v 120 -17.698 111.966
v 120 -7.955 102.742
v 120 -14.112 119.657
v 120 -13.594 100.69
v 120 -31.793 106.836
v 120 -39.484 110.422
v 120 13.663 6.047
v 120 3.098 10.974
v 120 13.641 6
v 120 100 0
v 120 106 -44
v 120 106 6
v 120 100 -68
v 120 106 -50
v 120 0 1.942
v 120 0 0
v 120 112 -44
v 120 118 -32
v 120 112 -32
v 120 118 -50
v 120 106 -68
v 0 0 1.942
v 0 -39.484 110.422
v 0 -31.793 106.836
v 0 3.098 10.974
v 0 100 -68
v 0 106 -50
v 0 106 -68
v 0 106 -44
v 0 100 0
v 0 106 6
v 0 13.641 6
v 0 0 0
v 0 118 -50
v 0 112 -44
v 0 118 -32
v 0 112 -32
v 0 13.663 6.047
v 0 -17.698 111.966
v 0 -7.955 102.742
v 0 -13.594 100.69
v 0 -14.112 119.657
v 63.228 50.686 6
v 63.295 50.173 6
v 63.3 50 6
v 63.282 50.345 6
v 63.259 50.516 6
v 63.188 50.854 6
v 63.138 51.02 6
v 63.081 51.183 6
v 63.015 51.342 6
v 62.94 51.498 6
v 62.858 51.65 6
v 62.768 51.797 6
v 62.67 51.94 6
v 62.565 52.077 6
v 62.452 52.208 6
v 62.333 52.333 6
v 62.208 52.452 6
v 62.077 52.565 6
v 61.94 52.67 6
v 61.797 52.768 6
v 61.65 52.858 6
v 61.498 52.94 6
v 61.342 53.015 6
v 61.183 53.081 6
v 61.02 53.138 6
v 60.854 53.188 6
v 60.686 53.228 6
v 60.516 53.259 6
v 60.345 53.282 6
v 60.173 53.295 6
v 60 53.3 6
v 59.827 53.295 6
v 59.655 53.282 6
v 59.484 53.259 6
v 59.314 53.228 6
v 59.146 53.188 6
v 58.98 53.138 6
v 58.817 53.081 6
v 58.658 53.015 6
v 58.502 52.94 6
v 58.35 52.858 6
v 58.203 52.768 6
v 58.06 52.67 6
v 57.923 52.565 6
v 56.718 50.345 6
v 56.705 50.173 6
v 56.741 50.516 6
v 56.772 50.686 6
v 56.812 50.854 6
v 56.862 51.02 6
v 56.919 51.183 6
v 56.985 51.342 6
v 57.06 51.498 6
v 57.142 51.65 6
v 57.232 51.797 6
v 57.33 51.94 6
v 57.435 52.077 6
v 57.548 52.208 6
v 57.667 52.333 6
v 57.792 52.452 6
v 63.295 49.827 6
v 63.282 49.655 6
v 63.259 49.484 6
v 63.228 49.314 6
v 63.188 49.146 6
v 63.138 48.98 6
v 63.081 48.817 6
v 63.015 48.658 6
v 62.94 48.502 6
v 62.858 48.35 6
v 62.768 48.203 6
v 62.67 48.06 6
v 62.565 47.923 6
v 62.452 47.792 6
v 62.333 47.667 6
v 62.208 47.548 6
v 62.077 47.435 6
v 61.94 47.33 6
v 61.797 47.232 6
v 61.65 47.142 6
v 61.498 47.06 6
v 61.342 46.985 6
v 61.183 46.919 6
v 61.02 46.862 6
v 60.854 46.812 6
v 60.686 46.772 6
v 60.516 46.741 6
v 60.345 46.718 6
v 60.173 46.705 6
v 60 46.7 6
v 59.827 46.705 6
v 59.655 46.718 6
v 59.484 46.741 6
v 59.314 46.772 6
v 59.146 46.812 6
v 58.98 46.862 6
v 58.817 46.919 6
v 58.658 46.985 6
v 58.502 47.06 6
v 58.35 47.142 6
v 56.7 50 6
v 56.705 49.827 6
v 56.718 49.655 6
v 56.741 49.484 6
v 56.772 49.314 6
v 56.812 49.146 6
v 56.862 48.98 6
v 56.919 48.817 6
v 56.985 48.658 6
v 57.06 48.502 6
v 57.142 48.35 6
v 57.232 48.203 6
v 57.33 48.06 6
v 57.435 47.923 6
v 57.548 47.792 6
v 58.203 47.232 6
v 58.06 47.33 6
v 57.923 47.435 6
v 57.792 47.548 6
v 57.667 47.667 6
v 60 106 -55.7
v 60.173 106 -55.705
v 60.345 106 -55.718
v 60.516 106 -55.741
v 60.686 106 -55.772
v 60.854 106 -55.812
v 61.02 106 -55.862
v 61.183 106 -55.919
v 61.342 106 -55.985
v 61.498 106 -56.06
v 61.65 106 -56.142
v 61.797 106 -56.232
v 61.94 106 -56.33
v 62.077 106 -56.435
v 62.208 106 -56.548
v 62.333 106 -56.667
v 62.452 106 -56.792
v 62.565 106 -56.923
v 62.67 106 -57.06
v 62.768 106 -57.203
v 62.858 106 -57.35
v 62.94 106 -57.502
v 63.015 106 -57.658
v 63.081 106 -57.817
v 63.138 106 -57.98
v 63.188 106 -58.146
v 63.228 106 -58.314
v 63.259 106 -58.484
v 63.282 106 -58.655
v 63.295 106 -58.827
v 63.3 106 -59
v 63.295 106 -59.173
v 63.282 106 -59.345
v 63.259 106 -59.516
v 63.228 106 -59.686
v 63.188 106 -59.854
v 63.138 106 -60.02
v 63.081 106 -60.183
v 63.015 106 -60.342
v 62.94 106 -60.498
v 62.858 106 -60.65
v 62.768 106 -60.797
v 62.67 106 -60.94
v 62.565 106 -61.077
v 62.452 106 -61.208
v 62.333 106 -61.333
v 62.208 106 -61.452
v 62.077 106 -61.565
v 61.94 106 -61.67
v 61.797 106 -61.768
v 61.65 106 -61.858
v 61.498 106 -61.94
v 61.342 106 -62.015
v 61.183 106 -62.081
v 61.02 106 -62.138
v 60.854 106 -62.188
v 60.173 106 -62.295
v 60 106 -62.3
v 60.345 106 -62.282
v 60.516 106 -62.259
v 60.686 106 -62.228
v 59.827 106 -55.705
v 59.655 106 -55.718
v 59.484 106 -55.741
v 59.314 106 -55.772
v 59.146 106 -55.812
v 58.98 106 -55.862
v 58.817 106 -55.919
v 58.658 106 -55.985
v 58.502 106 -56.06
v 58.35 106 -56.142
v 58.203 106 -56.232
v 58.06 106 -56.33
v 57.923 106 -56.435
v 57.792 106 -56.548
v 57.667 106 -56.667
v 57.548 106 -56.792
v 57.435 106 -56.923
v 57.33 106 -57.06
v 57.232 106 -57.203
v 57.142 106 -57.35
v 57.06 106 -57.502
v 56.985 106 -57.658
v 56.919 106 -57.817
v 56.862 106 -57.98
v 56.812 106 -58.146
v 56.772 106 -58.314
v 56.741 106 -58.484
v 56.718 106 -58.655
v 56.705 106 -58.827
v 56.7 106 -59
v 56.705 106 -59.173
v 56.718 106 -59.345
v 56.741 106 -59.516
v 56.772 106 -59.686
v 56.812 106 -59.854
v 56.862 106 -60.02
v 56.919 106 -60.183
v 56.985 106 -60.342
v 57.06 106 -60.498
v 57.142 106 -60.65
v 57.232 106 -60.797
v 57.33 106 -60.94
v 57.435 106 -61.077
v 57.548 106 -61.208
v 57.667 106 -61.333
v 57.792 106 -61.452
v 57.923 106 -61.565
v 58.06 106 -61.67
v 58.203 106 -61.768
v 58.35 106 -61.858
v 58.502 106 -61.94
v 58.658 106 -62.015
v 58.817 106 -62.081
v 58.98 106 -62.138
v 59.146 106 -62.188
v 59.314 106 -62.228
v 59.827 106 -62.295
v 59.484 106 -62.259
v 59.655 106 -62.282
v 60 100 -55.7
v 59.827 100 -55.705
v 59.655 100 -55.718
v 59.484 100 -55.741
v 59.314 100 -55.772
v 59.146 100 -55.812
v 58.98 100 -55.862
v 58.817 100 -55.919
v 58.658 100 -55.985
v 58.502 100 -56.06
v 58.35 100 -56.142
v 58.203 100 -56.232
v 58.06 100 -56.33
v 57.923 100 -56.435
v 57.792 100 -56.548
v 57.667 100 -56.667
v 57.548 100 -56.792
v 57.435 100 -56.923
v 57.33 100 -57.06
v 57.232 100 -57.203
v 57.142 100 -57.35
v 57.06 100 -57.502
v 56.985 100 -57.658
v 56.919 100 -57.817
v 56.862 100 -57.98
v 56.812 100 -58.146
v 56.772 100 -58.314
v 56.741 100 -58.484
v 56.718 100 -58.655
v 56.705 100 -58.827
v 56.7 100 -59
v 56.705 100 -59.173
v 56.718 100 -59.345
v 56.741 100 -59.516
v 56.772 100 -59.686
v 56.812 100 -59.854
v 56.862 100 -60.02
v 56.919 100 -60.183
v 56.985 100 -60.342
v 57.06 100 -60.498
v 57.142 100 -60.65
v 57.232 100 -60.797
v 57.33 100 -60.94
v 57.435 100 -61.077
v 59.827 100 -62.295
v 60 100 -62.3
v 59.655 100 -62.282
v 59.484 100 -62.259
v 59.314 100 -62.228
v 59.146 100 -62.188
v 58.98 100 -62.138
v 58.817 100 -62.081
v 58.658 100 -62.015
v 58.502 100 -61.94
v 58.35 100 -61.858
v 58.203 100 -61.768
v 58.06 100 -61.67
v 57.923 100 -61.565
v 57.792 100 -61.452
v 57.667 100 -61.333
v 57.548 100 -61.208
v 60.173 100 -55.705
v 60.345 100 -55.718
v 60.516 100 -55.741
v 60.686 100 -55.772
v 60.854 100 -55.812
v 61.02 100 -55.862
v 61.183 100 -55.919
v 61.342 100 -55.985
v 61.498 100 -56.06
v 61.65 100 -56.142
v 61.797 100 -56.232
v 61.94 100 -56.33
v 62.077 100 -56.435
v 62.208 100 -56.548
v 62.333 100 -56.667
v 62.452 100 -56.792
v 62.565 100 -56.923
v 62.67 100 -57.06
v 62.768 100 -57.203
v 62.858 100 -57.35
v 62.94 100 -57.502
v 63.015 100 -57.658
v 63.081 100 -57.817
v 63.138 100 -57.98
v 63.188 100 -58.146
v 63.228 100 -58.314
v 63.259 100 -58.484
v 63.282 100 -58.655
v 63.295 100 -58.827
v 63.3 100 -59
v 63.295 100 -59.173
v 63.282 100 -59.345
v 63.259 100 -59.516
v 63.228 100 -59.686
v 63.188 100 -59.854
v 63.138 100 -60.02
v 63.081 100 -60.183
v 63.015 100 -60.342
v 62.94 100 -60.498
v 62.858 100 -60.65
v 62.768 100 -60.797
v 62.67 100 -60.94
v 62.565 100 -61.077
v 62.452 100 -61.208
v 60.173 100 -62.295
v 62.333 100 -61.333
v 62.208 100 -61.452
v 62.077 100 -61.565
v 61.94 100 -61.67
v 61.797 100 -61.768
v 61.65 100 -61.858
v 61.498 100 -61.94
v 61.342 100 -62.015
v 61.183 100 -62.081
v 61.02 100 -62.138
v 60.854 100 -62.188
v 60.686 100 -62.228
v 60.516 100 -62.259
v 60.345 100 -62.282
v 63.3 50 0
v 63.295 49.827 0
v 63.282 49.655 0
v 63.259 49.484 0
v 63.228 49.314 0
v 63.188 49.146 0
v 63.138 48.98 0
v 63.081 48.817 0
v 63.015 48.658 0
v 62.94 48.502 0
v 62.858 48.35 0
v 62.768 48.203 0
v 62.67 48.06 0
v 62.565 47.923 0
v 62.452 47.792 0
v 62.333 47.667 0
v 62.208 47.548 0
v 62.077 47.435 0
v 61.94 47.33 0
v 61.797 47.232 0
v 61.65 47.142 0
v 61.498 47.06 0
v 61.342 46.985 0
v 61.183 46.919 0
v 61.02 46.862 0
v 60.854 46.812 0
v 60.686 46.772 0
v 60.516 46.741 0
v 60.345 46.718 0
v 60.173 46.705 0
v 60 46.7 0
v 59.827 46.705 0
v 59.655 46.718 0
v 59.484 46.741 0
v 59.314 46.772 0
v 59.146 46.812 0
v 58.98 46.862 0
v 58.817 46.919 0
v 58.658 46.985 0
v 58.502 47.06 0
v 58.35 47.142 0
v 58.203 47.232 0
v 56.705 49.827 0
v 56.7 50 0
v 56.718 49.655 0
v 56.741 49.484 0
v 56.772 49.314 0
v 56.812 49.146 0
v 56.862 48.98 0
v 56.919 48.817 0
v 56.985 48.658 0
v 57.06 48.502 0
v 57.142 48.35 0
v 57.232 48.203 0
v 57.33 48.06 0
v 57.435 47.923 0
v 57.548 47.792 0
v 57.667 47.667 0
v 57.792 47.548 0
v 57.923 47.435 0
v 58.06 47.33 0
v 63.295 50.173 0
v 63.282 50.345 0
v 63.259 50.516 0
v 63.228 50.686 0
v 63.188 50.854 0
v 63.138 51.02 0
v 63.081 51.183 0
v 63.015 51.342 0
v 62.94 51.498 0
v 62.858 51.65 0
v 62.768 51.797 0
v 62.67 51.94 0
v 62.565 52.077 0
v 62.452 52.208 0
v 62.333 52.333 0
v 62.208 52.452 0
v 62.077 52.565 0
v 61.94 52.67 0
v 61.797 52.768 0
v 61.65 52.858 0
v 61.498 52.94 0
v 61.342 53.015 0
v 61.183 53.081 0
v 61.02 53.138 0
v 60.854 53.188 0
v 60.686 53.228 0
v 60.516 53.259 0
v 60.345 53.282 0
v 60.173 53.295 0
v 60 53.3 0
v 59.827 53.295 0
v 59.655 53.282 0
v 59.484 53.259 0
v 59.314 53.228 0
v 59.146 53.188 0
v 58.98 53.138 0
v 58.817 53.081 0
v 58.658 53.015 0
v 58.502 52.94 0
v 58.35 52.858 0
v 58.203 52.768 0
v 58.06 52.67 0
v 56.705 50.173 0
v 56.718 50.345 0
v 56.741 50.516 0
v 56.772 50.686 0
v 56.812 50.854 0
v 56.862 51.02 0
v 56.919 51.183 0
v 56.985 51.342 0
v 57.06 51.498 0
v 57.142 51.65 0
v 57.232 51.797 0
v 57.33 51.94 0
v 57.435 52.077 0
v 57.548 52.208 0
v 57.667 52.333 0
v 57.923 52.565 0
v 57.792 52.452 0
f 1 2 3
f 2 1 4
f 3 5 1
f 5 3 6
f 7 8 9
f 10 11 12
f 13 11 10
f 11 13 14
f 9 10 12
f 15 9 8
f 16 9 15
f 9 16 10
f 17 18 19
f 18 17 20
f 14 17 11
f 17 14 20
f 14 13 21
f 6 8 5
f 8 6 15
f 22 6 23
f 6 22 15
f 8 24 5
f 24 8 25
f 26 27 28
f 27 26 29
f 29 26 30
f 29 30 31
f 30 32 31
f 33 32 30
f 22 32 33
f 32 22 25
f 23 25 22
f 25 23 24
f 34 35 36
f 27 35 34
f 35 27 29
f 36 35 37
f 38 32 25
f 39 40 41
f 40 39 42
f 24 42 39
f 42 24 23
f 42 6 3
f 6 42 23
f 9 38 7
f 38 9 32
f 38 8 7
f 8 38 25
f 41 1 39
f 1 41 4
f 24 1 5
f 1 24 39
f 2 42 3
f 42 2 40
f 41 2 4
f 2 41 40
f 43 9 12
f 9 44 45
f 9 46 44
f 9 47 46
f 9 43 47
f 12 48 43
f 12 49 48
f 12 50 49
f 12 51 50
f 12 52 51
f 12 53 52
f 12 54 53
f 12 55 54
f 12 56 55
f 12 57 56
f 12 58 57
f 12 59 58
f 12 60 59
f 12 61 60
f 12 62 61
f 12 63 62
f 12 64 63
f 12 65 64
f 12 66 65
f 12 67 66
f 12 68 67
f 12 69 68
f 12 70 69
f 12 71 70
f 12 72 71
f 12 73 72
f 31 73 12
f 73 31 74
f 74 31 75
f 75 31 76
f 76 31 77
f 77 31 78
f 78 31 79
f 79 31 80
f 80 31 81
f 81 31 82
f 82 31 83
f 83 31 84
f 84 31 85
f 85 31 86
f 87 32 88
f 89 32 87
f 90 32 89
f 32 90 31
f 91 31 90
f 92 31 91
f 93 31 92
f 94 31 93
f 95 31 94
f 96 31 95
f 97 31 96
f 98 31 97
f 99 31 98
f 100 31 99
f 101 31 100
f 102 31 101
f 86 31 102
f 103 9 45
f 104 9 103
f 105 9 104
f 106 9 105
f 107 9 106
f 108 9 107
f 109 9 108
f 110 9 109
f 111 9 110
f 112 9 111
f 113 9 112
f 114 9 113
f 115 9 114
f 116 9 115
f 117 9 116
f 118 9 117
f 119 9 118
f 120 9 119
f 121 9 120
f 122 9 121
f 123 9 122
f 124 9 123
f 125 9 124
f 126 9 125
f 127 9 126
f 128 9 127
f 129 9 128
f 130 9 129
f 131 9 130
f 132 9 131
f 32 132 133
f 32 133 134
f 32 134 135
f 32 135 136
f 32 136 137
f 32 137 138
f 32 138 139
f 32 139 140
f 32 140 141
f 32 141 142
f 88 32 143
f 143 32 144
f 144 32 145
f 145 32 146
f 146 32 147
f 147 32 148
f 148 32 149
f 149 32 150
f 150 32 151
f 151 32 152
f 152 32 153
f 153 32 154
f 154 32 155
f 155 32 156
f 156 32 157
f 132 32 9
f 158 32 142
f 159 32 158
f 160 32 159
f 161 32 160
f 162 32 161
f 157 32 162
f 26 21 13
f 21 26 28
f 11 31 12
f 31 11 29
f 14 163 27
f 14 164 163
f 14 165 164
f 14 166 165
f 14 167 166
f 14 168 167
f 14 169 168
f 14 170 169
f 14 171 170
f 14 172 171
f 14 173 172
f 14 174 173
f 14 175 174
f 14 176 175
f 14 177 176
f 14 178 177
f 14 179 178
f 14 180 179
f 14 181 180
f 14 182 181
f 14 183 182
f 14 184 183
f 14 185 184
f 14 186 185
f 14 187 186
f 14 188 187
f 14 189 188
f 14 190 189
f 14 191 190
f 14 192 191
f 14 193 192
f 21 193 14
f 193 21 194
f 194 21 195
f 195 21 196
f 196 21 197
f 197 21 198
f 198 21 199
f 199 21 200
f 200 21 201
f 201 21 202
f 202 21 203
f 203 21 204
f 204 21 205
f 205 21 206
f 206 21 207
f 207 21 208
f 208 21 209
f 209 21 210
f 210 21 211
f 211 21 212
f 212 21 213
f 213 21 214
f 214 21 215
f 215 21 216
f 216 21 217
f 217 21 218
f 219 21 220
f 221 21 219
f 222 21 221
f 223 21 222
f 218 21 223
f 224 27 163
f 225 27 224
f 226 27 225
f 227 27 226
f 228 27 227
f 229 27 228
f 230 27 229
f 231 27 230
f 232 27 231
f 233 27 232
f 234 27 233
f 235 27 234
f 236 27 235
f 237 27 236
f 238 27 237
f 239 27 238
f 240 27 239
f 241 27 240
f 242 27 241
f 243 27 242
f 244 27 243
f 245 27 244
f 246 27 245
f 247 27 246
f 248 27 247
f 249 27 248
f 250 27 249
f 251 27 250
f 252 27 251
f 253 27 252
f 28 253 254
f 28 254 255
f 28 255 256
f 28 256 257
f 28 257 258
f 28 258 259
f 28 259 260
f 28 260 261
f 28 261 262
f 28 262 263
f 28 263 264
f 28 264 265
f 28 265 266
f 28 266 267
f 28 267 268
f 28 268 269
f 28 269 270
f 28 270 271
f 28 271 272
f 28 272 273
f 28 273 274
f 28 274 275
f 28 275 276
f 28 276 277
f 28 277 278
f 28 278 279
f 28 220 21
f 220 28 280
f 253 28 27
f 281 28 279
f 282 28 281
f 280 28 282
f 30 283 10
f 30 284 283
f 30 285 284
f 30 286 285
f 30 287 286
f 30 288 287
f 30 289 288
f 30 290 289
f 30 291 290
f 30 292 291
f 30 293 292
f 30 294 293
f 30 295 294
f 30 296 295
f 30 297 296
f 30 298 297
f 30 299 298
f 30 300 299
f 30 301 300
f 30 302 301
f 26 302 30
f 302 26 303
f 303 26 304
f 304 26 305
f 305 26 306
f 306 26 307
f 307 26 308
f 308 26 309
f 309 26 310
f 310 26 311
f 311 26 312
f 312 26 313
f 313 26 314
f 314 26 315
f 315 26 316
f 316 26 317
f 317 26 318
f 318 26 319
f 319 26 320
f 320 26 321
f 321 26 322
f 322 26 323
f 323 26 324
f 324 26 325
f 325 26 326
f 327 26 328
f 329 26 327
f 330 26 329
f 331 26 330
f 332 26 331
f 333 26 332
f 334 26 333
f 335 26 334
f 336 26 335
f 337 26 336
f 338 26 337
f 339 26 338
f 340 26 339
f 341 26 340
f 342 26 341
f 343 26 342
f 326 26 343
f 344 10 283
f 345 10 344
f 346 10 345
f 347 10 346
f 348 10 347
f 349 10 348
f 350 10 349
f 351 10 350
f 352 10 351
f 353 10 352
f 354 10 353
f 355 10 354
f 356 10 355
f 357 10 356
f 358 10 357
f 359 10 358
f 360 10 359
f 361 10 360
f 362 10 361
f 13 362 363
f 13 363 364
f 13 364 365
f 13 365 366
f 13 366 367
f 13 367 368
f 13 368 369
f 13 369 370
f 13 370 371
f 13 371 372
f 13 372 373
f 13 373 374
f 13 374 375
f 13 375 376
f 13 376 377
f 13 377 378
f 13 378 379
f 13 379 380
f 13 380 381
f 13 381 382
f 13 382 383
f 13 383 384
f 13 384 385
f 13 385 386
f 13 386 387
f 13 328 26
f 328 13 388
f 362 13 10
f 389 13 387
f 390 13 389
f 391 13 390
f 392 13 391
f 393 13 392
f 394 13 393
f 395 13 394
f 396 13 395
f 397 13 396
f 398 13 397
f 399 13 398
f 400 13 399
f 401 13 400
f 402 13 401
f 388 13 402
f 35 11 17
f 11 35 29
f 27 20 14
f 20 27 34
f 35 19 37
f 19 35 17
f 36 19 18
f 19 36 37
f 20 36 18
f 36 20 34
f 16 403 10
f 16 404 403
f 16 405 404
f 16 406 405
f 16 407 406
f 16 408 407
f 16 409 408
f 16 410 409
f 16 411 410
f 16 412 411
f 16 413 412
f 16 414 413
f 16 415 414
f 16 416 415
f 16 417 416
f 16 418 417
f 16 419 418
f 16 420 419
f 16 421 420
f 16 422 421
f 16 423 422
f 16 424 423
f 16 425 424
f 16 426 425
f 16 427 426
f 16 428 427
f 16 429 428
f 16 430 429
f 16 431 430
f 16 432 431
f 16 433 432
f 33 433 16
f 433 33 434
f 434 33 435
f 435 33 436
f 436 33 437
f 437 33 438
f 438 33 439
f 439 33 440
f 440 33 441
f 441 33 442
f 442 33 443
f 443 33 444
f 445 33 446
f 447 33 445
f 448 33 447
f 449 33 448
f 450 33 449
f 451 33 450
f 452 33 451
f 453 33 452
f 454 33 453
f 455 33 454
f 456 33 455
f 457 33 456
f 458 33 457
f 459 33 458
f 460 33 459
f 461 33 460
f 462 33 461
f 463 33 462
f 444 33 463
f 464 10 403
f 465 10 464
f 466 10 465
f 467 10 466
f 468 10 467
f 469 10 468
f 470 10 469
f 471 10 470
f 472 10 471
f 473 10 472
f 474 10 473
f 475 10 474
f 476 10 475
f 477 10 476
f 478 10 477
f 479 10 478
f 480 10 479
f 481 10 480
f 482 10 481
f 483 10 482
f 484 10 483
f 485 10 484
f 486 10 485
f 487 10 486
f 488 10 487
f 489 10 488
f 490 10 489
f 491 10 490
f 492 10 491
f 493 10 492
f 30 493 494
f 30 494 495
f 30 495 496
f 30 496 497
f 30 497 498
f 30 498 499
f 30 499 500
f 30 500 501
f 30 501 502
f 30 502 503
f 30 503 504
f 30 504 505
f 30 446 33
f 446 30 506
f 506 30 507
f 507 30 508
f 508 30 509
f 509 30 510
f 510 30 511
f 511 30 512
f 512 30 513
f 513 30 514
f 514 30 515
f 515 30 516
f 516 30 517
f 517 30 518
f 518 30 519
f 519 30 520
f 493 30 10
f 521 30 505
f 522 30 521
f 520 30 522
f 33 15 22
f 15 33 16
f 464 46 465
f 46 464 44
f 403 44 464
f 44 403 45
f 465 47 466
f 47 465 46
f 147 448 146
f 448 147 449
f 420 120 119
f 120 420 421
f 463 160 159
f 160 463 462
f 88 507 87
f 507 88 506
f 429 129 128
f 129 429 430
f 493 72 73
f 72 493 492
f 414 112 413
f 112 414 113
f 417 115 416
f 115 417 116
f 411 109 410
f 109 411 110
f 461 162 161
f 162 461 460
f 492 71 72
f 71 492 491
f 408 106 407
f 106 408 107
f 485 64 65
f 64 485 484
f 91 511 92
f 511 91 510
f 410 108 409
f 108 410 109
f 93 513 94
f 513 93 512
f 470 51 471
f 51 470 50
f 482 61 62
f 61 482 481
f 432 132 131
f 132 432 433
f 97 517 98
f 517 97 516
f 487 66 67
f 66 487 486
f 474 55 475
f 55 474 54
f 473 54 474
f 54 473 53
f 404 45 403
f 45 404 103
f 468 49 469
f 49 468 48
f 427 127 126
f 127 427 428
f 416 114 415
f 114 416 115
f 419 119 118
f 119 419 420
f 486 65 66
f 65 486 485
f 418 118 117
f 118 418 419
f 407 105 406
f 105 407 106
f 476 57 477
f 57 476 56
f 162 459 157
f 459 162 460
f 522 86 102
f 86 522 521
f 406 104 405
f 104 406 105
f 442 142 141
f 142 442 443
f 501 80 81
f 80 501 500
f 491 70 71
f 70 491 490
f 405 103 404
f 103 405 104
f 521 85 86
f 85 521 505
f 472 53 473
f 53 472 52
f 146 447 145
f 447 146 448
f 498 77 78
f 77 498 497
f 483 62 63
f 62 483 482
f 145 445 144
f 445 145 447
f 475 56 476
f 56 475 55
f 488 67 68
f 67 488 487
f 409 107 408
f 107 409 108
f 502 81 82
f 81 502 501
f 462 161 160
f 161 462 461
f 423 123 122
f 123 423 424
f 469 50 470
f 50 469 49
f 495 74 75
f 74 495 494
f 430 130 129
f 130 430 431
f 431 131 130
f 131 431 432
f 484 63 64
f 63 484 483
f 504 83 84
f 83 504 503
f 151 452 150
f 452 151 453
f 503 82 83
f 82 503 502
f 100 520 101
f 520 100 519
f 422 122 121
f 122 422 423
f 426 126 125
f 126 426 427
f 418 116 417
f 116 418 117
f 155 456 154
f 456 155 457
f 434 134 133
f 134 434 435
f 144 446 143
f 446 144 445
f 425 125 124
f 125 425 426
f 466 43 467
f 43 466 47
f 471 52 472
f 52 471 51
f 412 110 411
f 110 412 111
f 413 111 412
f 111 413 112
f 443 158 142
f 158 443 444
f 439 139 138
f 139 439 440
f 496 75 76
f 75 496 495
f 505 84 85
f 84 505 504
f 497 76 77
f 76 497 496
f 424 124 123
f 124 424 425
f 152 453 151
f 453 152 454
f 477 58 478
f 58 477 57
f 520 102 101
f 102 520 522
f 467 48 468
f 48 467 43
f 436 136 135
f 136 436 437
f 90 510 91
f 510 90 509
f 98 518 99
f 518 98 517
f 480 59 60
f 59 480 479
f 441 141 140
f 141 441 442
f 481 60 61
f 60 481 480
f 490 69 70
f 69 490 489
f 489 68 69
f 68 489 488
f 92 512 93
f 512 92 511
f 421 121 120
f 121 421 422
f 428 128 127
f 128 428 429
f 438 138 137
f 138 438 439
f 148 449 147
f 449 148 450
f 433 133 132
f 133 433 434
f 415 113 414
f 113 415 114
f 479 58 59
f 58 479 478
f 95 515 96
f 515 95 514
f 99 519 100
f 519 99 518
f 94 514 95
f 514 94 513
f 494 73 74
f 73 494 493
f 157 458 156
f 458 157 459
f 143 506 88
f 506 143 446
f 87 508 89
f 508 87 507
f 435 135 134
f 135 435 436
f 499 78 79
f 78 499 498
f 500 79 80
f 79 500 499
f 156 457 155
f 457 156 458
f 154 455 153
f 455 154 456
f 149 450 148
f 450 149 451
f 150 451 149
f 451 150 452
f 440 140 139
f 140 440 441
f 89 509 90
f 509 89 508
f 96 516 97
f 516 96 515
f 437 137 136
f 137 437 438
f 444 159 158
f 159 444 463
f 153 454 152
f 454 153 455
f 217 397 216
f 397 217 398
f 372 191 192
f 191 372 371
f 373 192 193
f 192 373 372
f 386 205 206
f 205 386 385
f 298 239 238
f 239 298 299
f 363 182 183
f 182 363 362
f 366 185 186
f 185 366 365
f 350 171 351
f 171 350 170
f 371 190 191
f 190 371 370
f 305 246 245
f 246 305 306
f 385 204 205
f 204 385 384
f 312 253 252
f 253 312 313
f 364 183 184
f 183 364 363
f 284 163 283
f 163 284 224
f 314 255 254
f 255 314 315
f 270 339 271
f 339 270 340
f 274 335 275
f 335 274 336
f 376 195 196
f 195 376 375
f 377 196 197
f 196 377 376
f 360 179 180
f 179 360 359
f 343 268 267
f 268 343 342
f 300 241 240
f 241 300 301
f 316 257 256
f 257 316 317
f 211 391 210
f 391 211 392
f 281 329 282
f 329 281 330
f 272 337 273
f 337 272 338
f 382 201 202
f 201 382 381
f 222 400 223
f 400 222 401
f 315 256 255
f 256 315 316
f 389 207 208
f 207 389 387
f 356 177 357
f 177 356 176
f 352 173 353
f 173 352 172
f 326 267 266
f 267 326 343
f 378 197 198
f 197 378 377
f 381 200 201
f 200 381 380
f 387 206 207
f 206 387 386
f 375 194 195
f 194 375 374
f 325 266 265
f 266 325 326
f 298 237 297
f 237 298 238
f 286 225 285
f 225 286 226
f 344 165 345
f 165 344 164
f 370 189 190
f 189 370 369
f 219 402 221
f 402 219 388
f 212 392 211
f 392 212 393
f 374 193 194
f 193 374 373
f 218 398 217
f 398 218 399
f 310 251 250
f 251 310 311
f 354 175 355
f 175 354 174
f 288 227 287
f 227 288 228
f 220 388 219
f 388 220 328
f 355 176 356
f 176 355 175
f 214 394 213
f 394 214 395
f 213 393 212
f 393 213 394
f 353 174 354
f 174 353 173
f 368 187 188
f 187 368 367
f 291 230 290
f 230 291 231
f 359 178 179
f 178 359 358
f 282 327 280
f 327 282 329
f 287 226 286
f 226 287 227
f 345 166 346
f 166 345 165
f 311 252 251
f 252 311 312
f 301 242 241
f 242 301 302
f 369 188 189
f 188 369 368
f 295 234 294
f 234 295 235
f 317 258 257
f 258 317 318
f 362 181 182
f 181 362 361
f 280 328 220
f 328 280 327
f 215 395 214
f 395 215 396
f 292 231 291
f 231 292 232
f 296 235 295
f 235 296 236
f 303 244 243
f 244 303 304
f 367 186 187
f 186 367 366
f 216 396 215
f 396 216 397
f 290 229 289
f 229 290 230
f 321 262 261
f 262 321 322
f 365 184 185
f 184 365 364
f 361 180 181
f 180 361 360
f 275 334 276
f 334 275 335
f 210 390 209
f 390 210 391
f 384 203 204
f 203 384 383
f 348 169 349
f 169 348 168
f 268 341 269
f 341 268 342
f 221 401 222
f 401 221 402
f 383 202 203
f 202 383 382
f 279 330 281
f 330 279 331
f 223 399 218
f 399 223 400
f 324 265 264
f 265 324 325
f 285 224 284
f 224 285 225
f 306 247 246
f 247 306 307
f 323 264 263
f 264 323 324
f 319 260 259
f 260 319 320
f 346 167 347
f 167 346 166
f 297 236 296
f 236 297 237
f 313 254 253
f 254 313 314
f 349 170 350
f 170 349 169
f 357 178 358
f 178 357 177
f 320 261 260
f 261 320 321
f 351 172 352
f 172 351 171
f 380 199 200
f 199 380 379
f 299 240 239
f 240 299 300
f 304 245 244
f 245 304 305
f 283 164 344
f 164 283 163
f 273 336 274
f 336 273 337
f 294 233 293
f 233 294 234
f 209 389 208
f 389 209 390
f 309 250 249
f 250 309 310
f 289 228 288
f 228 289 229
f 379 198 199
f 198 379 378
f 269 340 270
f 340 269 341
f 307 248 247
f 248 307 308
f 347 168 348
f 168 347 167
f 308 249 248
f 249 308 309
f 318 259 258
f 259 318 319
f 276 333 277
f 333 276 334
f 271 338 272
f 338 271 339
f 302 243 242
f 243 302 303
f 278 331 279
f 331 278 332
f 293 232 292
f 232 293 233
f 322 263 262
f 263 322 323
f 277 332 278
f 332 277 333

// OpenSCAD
$fn = 120;
tub_width = 100;
guard_height = 98.5 + 18;
guard_width = 155;
guard_thickness = 6;
guard_angle = 110;
bracket_width = 120;
screw_hole_diameter = 6.6;
gusset_size = 4;

difference() {
  bracket();
  translate([bracket_width/2, tub_width/2, -1])
  cylinder(h=guard_thickness*2, d=screw_hole_diameter);

  translate([bracket_width/2, tub_width+guard_thickness+1, -56+guard_thickness - guard_thickness*1.5])
  rotate([90, 0, 0])
  cylinder(h=guard_thickness*2, d=screw_hole_diameter);
}

module bracket() {
  union() {
    color("yellow")
    cube([bracket_width, tub_width, guard_thickness]);

    translate([0, guard_thickness, guard_thickness/2])
    rotate([guard_angle, 0, 0])
    height_bracket();

    bottom_bracket();
  }
}

module height_bracket() {
  union() {
    color("red")
    cube([bracket_width, guard_height, guard_thickness]);

    color("violet")
    translate([0, -4, -4])
    rotate([315, 0, 0])
    cube([bracket_width, guard_thickness, guard_thickness*2]);

    color("orange")
    translate([0, guard_height-guard_thickness, -15])
    cube([bracket_width, guard_thickness, 15]);

    color("purple")
    translate([0, guard_height-guard_thickness*3, -15-guard_thickness])
    cube([bracket_width, guard_thickness*3, guard_thickness]);
  }
}

module bottom_bracket() {
  union() {
    color("pink")
    translate([0, tub_width, -56+guard_thickness - guard_thickness*3])
    cube([bracket_width, guard_thickness, 56 + guard_thickness*3]);

    color("orange")
    translate([0, tub_width+guard_thickness, -56+guard_thickness])
    cube([bracket_width, guard_thickness, guard_thickness]);

    color("purple")
    translate([0, tub_width+guard_thickness*2, -56+guard_thickness])
    cube([bracket_width, guard_thickness, guard_thickness*3]);
  }
}
